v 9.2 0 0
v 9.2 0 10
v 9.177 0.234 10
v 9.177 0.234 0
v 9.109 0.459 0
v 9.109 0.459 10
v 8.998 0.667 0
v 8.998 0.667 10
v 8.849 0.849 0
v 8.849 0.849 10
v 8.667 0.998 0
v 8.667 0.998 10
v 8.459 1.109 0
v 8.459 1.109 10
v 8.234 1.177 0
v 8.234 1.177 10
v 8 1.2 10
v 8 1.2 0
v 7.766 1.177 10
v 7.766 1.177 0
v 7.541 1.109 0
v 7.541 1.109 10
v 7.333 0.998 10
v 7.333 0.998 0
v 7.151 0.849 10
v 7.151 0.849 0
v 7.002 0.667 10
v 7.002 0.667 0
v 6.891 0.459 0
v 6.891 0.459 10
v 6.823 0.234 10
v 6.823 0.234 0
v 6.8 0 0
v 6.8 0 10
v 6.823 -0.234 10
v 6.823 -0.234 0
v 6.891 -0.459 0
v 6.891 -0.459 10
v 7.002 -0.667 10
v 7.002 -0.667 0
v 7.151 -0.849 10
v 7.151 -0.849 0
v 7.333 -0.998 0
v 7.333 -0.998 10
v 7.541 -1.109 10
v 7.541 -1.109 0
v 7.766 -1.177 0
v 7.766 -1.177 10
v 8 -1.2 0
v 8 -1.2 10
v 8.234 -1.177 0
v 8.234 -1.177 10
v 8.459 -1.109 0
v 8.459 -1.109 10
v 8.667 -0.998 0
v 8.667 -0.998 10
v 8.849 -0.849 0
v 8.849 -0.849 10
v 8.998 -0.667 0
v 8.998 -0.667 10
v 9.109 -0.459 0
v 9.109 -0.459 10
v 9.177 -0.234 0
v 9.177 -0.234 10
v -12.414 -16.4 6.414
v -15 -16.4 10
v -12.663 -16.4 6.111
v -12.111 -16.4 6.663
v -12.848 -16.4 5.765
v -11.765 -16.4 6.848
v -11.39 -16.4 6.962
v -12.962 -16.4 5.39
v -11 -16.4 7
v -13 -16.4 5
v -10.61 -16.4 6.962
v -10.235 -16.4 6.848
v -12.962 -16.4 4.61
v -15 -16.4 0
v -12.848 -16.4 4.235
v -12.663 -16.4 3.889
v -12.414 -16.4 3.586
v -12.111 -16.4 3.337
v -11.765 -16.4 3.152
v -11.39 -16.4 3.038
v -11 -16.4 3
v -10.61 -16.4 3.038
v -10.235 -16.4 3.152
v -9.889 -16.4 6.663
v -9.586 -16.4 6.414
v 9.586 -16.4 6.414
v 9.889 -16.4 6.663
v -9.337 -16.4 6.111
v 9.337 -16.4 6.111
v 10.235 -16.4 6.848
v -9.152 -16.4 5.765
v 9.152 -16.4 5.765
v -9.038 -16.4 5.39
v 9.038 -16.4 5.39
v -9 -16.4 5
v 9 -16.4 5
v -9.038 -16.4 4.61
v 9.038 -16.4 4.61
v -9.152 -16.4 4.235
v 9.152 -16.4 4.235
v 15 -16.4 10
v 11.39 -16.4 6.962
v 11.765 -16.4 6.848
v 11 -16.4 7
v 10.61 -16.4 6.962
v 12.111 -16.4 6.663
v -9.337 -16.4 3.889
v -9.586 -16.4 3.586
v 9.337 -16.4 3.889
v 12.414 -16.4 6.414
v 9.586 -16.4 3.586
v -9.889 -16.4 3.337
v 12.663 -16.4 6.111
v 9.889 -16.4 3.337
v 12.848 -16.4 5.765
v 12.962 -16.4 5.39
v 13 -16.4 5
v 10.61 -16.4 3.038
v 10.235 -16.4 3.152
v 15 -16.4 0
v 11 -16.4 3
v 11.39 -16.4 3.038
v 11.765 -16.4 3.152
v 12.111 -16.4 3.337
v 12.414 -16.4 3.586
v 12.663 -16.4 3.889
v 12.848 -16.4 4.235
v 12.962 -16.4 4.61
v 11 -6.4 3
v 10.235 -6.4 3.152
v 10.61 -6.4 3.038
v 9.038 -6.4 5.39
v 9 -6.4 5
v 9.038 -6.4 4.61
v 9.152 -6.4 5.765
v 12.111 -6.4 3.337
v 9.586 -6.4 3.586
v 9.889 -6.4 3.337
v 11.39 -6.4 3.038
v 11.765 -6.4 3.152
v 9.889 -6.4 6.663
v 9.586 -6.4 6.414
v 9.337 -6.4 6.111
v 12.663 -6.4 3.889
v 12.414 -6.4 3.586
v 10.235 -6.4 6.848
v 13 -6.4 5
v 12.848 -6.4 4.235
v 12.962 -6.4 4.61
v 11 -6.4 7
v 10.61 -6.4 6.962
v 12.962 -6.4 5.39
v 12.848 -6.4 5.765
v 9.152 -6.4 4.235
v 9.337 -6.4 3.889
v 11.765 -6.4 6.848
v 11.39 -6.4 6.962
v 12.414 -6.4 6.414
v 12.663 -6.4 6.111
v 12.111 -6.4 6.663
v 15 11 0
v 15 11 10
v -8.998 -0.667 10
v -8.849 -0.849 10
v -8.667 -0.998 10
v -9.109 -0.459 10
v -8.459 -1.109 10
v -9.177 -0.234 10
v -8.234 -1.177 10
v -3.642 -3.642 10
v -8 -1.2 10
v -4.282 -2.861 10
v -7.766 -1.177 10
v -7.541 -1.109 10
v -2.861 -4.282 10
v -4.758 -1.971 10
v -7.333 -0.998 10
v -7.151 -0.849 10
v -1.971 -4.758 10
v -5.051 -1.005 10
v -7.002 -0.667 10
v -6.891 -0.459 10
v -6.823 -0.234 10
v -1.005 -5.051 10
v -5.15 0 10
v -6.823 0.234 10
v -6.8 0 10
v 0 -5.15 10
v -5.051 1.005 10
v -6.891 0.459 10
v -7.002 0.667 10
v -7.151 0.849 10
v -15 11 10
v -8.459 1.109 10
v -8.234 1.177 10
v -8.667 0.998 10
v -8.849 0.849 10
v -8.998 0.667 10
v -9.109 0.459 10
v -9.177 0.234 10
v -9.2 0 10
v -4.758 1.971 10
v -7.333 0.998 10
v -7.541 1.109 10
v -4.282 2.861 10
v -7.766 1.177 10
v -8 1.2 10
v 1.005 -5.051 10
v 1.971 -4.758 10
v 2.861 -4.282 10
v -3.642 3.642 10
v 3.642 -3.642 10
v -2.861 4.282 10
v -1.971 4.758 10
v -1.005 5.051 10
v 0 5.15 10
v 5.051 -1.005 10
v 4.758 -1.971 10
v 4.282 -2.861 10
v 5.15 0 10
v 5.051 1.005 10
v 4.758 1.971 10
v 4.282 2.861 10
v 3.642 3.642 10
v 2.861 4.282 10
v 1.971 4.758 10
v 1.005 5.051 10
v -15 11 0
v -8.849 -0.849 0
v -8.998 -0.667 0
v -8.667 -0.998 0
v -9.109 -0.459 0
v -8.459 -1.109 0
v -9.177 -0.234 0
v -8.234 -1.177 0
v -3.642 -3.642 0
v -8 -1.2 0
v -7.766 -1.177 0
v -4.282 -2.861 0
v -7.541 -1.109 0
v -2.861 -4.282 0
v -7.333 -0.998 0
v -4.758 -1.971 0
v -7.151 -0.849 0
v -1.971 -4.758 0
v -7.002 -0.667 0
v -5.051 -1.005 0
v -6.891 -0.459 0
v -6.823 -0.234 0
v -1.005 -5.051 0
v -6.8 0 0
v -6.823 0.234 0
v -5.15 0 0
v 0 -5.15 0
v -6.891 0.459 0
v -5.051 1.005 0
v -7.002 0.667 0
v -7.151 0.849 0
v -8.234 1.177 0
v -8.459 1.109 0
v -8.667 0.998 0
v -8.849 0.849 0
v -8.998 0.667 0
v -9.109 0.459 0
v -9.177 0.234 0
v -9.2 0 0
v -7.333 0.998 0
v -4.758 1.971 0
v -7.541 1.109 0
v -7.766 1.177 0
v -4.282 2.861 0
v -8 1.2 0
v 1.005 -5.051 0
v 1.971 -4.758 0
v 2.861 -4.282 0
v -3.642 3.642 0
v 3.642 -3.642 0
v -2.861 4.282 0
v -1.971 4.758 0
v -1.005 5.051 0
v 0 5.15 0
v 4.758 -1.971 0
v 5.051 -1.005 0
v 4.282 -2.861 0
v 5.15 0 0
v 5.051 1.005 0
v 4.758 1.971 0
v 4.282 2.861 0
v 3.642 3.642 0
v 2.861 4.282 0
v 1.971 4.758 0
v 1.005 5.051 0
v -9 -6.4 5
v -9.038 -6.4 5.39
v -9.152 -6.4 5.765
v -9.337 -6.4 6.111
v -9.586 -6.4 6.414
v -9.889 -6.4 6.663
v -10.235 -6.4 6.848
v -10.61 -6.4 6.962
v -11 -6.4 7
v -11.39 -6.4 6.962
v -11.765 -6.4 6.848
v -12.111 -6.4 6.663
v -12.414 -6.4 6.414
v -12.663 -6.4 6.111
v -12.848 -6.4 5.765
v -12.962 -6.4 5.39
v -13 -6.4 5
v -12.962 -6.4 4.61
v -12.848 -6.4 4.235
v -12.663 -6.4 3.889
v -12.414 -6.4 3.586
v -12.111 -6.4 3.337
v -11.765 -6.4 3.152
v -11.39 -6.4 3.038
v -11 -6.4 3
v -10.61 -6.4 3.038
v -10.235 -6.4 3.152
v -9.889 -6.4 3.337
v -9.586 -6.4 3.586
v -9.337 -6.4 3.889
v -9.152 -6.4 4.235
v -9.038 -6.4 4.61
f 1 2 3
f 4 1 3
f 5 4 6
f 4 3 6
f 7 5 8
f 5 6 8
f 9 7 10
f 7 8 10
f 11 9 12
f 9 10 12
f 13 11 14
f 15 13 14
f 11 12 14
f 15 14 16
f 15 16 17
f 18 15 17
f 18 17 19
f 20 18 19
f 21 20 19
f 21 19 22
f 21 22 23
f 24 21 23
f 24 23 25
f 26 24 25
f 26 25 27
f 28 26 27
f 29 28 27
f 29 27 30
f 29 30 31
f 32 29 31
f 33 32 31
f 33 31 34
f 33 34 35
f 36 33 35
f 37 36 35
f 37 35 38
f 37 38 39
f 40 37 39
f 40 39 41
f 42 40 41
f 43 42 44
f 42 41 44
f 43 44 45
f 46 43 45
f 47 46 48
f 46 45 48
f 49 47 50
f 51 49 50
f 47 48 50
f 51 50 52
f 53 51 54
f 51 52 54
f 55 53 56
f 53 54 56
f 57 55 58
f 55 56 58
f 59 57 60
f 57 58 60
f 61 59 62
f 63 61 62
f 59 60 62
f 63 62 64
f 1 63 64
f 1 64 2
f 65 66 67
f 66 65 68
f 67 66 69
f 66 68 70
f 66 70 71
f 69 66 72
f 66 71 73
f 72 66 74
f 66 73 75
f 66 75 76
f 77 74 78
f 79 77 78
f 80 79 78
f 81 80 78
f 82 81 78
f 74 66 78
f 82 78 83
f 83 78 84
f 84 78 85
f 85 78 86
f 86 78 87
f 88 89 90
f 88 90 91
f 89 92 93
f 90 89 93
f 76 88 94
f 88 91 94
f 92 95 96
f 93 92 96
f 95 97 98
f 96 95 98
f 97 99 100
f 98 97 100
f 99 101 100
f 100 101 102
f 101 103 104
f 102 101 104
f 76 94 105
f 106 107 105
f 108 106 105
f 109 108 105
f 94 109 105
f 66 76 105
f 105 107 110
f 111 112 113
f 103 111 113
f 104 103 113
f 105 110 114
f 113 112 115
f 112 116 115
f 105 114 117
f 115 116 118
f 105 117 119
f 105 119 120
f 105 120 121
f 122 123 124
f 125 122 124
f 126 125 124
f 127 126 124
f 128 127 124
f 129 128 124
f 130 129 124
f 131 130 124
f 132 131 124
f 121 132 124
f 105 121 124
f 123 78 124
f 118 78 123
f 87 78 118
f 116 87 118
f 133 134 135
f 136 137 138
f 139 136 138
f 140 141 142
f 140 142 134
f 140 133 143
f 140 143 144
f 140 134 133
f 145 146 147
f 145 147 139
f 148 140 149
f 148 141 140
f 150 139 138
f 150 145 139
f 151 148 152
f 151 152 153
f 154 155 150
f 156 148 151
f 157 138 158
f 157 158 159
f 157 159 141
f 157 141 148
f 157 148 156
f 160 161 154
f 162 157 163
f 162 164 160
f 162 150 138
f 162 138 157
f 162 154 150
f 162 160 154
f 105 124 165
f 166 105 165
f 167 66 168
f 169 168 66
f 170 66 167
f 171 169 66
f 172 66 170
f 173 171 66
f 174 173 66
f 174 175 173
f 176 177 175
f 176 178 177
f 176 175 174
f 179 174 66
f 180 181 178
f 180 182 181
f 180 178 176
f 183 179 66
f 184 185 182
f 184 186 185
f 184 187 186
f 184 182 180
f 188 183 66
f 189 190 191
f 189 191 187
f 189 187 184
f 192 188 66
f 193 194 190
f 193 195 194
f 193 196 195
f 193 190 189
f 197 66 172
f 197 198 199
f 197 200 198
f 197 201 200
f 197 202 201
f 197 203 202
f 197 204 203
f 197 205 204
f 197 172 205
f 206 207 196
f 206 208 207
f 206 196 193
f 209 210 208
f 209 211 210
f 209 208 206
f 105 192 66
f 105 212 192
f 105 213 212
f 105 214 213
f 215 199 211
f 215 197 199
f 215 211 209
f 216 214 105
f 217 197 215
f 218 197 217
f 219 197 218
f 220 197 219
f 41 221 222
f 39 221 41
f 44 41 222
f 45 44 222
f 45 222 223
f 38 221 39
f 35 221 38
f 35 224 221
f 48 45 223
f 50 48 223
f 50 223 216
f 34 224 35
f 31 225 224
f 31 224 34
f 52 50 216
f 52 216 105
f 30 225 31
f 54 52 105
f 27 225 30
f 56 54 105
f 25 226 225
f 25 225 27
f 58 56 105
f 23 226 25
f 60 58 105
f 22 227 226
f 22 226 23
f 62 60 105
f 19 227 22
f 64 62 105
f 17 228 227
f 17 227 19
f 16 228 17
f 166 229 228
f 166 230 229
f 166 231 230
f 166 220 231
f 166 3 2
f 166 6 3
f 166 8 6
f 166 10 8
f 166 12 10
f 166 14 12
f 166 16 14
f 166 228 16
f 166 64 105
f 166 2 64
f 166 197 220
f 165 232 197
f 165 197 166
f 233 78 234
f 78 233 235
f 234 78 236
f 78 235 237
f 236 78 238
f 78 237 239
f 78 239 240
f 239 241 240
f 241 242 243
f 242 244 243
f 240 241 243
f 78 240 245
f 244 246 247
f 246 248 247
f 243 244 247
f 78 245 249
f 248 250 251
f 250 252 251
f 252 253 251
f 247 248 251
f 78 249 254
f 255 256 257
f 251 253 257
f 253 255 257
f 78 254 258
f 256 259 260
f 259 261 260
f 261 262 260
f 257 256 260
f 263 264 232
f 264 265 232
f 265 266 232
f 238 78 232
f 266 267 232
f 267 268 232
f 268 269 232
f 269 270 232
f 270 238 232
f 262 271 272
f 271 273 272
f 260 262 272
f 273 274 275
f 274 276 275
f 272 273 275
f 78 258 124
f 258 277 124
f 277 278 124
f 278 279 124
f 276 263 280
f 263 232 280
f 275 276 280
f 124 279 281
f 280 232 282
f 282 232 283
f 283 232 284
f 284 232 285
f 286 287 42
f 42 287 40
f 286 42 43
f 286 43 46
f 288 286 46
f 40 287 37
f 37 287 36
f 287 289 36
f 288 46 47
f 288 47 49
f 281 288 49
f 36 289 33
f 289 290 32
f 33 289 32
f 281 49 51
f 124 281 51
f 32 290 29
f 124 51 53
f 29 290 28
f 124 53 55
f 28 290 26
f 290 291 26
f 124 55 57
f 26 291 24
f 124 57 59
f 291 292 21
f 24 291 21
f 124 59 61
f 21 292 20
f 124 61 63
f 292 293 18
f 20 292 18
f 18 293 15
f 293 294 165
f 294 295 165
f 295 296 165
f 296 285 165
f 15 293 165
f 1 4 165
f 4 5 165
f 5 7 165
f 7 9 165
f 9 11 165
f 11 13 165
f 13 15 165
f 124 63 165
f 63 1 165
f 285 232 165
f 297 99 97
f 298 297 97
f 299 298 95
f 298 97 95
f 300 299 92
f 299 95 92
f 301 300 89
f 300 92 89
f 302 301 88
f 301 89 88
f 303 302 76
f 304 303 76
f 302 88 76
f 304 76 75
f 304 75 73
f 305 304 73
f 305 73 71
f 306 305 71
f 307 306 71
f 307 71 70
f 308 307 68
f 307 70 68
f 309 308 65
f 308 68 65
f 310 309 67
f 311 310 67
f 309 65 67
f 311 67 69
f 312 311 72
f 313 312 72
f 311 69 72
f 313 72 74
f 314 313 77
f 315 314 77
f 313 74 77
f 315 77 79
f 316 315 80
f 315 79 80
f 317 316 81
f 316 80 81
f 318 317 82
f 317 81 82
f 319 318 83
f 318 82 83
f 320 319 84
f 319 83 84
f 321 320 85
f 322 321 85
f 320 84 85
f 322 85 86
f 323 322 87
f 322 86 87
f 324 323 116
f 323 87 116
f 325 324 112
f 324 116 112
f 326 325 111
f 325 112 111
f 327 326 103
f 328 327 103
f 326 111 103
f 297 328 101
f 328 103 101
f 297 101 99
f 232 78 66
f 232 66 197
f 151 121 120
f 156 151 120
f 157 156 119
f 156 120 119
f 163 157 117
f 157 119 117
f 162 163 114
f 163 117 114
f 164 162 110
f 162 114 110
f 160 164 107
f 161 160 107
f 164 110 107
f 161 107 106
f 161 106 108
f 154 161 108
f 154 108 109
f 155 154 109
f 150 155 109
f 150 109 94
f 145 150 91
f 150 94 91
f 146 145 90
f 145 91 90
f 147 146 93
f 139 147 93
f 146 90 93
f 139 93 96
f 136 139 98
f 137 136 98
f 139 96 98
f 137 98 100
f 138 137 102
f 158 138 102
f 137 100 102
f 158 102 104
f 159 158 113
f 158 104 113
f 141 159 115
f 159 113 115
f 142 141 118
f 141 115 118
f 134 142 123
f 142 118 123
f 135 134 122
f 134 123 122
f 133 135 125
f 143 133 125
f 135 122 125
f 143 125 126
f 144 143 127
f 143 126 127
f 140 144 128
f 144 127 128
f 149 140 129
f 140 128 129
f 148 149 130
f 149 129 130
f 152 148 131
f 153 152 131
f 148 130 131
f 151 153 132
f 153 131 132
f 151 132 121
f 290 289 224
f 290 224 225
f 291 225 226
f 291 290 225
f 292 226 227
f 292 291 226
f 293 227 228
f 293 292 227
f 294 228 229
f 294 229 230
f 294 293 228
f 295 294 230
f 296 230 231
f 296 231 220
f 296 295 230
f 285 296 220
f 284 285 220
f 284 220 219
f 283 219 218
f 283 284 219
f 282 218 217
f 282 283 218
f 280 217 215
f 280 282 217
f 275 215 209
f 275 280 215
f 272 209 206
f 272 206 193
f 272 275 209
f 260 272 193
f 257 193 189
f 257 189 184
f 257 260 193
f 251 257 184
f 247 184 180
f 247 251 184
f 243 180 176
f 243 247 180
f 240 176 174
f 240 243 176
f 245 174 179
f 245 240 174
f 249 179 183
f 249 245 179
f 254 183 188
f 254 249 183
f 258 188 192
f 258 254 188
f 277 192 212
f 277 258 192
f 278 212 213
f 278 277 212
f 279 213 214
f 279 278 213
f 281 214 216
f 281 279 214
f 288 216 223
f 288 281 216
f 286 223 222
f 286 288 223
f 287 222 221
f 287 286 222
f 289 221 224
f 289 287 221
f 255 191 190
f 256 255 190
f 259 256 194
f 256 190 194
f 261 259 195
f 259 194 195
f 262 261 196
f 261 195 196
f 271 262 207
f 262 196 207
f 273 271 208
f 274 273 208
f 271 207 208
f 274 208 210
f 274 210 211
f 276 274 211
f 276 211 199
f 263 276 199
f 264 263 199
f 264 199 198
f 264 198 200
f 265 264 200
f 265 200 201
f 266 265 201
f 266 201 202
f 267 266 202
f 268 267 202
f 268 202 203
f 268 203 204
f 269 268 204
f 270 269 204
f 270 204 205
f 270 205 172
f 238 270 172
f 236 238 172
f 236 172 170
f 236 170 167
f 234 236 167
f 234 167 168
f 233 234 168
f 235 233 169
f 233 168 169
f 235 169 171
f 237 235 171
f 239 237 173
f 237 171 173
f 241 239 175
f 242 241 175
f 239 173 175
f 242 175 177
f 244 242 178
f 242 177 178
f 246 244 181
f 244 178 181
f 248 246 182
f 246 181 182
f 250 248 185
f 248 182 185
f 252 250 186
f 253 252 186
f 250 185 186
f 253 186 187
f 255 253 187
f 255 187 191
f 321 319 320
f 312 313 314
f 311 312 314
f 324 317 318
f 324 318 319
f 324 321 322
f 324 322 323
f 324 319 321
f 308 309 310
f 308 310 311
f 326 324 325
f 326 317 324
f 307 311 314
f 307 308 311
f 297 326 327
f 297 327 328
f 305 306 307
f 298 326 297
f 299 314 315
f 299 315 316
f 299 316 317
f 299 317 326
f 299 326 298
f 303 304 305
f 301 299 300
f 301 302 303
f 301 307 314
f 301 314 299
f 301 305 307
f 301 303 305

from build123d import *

# Parameters (mm, degrees)
SKETCH1_W           = 30
SKETCH1_H           = 27.4
SKETCH1_R           = 5.15
BOSS_EXTRUDE1_DEPTH = 10
SKETCH2_R           = 2
CUT_EXTRUDE1_DEPTH  = 10
SKETCH7_R           = 1.2
CUT_EXTRUDE2_DEPTH  = 11


with BuildPart() as part:
    # Sketch1 → Boss-Extrude1 (new body)
    with BuildSketch(Plane.XY):
        with Locations((0, -2.7)):
            Rectangle(SKETCH1_W, SKETCH1_H)
        Circle(SKETCH1_R, mode=Mode.SUBTRACT)
    extrude(amount=BOSS_EXTRUDE1_DEPTH)

    # Sketch2 → Cut-Extrude1 (cut)
    with BuildSketch(Plane.XZ.offset(16.4)):
        with Locations((-11, 5)):
            Circle(SKETCH2_R)
        with Locations((11, 5)):
            Circle(SKETCH2_R)
    extrude(amount=-CUT_EXTRUDE1_DEPTH, mode=Mode.SUBTRACT)

    # Sketch7 → Cut-Extrude2 (cut, through all)
    with BuildSketch(Plane.XY.offset(10)):
        with Locations((-8, 0)):
            Circle(SKETCH7_R)
        with Locations((8, 0)):
            Circle(SKETCH7_R)
    extrude(amount=-CUT_EXTRUDE2_DEPTH, mode=Mode.SUBTRACT)


solid = part.part
